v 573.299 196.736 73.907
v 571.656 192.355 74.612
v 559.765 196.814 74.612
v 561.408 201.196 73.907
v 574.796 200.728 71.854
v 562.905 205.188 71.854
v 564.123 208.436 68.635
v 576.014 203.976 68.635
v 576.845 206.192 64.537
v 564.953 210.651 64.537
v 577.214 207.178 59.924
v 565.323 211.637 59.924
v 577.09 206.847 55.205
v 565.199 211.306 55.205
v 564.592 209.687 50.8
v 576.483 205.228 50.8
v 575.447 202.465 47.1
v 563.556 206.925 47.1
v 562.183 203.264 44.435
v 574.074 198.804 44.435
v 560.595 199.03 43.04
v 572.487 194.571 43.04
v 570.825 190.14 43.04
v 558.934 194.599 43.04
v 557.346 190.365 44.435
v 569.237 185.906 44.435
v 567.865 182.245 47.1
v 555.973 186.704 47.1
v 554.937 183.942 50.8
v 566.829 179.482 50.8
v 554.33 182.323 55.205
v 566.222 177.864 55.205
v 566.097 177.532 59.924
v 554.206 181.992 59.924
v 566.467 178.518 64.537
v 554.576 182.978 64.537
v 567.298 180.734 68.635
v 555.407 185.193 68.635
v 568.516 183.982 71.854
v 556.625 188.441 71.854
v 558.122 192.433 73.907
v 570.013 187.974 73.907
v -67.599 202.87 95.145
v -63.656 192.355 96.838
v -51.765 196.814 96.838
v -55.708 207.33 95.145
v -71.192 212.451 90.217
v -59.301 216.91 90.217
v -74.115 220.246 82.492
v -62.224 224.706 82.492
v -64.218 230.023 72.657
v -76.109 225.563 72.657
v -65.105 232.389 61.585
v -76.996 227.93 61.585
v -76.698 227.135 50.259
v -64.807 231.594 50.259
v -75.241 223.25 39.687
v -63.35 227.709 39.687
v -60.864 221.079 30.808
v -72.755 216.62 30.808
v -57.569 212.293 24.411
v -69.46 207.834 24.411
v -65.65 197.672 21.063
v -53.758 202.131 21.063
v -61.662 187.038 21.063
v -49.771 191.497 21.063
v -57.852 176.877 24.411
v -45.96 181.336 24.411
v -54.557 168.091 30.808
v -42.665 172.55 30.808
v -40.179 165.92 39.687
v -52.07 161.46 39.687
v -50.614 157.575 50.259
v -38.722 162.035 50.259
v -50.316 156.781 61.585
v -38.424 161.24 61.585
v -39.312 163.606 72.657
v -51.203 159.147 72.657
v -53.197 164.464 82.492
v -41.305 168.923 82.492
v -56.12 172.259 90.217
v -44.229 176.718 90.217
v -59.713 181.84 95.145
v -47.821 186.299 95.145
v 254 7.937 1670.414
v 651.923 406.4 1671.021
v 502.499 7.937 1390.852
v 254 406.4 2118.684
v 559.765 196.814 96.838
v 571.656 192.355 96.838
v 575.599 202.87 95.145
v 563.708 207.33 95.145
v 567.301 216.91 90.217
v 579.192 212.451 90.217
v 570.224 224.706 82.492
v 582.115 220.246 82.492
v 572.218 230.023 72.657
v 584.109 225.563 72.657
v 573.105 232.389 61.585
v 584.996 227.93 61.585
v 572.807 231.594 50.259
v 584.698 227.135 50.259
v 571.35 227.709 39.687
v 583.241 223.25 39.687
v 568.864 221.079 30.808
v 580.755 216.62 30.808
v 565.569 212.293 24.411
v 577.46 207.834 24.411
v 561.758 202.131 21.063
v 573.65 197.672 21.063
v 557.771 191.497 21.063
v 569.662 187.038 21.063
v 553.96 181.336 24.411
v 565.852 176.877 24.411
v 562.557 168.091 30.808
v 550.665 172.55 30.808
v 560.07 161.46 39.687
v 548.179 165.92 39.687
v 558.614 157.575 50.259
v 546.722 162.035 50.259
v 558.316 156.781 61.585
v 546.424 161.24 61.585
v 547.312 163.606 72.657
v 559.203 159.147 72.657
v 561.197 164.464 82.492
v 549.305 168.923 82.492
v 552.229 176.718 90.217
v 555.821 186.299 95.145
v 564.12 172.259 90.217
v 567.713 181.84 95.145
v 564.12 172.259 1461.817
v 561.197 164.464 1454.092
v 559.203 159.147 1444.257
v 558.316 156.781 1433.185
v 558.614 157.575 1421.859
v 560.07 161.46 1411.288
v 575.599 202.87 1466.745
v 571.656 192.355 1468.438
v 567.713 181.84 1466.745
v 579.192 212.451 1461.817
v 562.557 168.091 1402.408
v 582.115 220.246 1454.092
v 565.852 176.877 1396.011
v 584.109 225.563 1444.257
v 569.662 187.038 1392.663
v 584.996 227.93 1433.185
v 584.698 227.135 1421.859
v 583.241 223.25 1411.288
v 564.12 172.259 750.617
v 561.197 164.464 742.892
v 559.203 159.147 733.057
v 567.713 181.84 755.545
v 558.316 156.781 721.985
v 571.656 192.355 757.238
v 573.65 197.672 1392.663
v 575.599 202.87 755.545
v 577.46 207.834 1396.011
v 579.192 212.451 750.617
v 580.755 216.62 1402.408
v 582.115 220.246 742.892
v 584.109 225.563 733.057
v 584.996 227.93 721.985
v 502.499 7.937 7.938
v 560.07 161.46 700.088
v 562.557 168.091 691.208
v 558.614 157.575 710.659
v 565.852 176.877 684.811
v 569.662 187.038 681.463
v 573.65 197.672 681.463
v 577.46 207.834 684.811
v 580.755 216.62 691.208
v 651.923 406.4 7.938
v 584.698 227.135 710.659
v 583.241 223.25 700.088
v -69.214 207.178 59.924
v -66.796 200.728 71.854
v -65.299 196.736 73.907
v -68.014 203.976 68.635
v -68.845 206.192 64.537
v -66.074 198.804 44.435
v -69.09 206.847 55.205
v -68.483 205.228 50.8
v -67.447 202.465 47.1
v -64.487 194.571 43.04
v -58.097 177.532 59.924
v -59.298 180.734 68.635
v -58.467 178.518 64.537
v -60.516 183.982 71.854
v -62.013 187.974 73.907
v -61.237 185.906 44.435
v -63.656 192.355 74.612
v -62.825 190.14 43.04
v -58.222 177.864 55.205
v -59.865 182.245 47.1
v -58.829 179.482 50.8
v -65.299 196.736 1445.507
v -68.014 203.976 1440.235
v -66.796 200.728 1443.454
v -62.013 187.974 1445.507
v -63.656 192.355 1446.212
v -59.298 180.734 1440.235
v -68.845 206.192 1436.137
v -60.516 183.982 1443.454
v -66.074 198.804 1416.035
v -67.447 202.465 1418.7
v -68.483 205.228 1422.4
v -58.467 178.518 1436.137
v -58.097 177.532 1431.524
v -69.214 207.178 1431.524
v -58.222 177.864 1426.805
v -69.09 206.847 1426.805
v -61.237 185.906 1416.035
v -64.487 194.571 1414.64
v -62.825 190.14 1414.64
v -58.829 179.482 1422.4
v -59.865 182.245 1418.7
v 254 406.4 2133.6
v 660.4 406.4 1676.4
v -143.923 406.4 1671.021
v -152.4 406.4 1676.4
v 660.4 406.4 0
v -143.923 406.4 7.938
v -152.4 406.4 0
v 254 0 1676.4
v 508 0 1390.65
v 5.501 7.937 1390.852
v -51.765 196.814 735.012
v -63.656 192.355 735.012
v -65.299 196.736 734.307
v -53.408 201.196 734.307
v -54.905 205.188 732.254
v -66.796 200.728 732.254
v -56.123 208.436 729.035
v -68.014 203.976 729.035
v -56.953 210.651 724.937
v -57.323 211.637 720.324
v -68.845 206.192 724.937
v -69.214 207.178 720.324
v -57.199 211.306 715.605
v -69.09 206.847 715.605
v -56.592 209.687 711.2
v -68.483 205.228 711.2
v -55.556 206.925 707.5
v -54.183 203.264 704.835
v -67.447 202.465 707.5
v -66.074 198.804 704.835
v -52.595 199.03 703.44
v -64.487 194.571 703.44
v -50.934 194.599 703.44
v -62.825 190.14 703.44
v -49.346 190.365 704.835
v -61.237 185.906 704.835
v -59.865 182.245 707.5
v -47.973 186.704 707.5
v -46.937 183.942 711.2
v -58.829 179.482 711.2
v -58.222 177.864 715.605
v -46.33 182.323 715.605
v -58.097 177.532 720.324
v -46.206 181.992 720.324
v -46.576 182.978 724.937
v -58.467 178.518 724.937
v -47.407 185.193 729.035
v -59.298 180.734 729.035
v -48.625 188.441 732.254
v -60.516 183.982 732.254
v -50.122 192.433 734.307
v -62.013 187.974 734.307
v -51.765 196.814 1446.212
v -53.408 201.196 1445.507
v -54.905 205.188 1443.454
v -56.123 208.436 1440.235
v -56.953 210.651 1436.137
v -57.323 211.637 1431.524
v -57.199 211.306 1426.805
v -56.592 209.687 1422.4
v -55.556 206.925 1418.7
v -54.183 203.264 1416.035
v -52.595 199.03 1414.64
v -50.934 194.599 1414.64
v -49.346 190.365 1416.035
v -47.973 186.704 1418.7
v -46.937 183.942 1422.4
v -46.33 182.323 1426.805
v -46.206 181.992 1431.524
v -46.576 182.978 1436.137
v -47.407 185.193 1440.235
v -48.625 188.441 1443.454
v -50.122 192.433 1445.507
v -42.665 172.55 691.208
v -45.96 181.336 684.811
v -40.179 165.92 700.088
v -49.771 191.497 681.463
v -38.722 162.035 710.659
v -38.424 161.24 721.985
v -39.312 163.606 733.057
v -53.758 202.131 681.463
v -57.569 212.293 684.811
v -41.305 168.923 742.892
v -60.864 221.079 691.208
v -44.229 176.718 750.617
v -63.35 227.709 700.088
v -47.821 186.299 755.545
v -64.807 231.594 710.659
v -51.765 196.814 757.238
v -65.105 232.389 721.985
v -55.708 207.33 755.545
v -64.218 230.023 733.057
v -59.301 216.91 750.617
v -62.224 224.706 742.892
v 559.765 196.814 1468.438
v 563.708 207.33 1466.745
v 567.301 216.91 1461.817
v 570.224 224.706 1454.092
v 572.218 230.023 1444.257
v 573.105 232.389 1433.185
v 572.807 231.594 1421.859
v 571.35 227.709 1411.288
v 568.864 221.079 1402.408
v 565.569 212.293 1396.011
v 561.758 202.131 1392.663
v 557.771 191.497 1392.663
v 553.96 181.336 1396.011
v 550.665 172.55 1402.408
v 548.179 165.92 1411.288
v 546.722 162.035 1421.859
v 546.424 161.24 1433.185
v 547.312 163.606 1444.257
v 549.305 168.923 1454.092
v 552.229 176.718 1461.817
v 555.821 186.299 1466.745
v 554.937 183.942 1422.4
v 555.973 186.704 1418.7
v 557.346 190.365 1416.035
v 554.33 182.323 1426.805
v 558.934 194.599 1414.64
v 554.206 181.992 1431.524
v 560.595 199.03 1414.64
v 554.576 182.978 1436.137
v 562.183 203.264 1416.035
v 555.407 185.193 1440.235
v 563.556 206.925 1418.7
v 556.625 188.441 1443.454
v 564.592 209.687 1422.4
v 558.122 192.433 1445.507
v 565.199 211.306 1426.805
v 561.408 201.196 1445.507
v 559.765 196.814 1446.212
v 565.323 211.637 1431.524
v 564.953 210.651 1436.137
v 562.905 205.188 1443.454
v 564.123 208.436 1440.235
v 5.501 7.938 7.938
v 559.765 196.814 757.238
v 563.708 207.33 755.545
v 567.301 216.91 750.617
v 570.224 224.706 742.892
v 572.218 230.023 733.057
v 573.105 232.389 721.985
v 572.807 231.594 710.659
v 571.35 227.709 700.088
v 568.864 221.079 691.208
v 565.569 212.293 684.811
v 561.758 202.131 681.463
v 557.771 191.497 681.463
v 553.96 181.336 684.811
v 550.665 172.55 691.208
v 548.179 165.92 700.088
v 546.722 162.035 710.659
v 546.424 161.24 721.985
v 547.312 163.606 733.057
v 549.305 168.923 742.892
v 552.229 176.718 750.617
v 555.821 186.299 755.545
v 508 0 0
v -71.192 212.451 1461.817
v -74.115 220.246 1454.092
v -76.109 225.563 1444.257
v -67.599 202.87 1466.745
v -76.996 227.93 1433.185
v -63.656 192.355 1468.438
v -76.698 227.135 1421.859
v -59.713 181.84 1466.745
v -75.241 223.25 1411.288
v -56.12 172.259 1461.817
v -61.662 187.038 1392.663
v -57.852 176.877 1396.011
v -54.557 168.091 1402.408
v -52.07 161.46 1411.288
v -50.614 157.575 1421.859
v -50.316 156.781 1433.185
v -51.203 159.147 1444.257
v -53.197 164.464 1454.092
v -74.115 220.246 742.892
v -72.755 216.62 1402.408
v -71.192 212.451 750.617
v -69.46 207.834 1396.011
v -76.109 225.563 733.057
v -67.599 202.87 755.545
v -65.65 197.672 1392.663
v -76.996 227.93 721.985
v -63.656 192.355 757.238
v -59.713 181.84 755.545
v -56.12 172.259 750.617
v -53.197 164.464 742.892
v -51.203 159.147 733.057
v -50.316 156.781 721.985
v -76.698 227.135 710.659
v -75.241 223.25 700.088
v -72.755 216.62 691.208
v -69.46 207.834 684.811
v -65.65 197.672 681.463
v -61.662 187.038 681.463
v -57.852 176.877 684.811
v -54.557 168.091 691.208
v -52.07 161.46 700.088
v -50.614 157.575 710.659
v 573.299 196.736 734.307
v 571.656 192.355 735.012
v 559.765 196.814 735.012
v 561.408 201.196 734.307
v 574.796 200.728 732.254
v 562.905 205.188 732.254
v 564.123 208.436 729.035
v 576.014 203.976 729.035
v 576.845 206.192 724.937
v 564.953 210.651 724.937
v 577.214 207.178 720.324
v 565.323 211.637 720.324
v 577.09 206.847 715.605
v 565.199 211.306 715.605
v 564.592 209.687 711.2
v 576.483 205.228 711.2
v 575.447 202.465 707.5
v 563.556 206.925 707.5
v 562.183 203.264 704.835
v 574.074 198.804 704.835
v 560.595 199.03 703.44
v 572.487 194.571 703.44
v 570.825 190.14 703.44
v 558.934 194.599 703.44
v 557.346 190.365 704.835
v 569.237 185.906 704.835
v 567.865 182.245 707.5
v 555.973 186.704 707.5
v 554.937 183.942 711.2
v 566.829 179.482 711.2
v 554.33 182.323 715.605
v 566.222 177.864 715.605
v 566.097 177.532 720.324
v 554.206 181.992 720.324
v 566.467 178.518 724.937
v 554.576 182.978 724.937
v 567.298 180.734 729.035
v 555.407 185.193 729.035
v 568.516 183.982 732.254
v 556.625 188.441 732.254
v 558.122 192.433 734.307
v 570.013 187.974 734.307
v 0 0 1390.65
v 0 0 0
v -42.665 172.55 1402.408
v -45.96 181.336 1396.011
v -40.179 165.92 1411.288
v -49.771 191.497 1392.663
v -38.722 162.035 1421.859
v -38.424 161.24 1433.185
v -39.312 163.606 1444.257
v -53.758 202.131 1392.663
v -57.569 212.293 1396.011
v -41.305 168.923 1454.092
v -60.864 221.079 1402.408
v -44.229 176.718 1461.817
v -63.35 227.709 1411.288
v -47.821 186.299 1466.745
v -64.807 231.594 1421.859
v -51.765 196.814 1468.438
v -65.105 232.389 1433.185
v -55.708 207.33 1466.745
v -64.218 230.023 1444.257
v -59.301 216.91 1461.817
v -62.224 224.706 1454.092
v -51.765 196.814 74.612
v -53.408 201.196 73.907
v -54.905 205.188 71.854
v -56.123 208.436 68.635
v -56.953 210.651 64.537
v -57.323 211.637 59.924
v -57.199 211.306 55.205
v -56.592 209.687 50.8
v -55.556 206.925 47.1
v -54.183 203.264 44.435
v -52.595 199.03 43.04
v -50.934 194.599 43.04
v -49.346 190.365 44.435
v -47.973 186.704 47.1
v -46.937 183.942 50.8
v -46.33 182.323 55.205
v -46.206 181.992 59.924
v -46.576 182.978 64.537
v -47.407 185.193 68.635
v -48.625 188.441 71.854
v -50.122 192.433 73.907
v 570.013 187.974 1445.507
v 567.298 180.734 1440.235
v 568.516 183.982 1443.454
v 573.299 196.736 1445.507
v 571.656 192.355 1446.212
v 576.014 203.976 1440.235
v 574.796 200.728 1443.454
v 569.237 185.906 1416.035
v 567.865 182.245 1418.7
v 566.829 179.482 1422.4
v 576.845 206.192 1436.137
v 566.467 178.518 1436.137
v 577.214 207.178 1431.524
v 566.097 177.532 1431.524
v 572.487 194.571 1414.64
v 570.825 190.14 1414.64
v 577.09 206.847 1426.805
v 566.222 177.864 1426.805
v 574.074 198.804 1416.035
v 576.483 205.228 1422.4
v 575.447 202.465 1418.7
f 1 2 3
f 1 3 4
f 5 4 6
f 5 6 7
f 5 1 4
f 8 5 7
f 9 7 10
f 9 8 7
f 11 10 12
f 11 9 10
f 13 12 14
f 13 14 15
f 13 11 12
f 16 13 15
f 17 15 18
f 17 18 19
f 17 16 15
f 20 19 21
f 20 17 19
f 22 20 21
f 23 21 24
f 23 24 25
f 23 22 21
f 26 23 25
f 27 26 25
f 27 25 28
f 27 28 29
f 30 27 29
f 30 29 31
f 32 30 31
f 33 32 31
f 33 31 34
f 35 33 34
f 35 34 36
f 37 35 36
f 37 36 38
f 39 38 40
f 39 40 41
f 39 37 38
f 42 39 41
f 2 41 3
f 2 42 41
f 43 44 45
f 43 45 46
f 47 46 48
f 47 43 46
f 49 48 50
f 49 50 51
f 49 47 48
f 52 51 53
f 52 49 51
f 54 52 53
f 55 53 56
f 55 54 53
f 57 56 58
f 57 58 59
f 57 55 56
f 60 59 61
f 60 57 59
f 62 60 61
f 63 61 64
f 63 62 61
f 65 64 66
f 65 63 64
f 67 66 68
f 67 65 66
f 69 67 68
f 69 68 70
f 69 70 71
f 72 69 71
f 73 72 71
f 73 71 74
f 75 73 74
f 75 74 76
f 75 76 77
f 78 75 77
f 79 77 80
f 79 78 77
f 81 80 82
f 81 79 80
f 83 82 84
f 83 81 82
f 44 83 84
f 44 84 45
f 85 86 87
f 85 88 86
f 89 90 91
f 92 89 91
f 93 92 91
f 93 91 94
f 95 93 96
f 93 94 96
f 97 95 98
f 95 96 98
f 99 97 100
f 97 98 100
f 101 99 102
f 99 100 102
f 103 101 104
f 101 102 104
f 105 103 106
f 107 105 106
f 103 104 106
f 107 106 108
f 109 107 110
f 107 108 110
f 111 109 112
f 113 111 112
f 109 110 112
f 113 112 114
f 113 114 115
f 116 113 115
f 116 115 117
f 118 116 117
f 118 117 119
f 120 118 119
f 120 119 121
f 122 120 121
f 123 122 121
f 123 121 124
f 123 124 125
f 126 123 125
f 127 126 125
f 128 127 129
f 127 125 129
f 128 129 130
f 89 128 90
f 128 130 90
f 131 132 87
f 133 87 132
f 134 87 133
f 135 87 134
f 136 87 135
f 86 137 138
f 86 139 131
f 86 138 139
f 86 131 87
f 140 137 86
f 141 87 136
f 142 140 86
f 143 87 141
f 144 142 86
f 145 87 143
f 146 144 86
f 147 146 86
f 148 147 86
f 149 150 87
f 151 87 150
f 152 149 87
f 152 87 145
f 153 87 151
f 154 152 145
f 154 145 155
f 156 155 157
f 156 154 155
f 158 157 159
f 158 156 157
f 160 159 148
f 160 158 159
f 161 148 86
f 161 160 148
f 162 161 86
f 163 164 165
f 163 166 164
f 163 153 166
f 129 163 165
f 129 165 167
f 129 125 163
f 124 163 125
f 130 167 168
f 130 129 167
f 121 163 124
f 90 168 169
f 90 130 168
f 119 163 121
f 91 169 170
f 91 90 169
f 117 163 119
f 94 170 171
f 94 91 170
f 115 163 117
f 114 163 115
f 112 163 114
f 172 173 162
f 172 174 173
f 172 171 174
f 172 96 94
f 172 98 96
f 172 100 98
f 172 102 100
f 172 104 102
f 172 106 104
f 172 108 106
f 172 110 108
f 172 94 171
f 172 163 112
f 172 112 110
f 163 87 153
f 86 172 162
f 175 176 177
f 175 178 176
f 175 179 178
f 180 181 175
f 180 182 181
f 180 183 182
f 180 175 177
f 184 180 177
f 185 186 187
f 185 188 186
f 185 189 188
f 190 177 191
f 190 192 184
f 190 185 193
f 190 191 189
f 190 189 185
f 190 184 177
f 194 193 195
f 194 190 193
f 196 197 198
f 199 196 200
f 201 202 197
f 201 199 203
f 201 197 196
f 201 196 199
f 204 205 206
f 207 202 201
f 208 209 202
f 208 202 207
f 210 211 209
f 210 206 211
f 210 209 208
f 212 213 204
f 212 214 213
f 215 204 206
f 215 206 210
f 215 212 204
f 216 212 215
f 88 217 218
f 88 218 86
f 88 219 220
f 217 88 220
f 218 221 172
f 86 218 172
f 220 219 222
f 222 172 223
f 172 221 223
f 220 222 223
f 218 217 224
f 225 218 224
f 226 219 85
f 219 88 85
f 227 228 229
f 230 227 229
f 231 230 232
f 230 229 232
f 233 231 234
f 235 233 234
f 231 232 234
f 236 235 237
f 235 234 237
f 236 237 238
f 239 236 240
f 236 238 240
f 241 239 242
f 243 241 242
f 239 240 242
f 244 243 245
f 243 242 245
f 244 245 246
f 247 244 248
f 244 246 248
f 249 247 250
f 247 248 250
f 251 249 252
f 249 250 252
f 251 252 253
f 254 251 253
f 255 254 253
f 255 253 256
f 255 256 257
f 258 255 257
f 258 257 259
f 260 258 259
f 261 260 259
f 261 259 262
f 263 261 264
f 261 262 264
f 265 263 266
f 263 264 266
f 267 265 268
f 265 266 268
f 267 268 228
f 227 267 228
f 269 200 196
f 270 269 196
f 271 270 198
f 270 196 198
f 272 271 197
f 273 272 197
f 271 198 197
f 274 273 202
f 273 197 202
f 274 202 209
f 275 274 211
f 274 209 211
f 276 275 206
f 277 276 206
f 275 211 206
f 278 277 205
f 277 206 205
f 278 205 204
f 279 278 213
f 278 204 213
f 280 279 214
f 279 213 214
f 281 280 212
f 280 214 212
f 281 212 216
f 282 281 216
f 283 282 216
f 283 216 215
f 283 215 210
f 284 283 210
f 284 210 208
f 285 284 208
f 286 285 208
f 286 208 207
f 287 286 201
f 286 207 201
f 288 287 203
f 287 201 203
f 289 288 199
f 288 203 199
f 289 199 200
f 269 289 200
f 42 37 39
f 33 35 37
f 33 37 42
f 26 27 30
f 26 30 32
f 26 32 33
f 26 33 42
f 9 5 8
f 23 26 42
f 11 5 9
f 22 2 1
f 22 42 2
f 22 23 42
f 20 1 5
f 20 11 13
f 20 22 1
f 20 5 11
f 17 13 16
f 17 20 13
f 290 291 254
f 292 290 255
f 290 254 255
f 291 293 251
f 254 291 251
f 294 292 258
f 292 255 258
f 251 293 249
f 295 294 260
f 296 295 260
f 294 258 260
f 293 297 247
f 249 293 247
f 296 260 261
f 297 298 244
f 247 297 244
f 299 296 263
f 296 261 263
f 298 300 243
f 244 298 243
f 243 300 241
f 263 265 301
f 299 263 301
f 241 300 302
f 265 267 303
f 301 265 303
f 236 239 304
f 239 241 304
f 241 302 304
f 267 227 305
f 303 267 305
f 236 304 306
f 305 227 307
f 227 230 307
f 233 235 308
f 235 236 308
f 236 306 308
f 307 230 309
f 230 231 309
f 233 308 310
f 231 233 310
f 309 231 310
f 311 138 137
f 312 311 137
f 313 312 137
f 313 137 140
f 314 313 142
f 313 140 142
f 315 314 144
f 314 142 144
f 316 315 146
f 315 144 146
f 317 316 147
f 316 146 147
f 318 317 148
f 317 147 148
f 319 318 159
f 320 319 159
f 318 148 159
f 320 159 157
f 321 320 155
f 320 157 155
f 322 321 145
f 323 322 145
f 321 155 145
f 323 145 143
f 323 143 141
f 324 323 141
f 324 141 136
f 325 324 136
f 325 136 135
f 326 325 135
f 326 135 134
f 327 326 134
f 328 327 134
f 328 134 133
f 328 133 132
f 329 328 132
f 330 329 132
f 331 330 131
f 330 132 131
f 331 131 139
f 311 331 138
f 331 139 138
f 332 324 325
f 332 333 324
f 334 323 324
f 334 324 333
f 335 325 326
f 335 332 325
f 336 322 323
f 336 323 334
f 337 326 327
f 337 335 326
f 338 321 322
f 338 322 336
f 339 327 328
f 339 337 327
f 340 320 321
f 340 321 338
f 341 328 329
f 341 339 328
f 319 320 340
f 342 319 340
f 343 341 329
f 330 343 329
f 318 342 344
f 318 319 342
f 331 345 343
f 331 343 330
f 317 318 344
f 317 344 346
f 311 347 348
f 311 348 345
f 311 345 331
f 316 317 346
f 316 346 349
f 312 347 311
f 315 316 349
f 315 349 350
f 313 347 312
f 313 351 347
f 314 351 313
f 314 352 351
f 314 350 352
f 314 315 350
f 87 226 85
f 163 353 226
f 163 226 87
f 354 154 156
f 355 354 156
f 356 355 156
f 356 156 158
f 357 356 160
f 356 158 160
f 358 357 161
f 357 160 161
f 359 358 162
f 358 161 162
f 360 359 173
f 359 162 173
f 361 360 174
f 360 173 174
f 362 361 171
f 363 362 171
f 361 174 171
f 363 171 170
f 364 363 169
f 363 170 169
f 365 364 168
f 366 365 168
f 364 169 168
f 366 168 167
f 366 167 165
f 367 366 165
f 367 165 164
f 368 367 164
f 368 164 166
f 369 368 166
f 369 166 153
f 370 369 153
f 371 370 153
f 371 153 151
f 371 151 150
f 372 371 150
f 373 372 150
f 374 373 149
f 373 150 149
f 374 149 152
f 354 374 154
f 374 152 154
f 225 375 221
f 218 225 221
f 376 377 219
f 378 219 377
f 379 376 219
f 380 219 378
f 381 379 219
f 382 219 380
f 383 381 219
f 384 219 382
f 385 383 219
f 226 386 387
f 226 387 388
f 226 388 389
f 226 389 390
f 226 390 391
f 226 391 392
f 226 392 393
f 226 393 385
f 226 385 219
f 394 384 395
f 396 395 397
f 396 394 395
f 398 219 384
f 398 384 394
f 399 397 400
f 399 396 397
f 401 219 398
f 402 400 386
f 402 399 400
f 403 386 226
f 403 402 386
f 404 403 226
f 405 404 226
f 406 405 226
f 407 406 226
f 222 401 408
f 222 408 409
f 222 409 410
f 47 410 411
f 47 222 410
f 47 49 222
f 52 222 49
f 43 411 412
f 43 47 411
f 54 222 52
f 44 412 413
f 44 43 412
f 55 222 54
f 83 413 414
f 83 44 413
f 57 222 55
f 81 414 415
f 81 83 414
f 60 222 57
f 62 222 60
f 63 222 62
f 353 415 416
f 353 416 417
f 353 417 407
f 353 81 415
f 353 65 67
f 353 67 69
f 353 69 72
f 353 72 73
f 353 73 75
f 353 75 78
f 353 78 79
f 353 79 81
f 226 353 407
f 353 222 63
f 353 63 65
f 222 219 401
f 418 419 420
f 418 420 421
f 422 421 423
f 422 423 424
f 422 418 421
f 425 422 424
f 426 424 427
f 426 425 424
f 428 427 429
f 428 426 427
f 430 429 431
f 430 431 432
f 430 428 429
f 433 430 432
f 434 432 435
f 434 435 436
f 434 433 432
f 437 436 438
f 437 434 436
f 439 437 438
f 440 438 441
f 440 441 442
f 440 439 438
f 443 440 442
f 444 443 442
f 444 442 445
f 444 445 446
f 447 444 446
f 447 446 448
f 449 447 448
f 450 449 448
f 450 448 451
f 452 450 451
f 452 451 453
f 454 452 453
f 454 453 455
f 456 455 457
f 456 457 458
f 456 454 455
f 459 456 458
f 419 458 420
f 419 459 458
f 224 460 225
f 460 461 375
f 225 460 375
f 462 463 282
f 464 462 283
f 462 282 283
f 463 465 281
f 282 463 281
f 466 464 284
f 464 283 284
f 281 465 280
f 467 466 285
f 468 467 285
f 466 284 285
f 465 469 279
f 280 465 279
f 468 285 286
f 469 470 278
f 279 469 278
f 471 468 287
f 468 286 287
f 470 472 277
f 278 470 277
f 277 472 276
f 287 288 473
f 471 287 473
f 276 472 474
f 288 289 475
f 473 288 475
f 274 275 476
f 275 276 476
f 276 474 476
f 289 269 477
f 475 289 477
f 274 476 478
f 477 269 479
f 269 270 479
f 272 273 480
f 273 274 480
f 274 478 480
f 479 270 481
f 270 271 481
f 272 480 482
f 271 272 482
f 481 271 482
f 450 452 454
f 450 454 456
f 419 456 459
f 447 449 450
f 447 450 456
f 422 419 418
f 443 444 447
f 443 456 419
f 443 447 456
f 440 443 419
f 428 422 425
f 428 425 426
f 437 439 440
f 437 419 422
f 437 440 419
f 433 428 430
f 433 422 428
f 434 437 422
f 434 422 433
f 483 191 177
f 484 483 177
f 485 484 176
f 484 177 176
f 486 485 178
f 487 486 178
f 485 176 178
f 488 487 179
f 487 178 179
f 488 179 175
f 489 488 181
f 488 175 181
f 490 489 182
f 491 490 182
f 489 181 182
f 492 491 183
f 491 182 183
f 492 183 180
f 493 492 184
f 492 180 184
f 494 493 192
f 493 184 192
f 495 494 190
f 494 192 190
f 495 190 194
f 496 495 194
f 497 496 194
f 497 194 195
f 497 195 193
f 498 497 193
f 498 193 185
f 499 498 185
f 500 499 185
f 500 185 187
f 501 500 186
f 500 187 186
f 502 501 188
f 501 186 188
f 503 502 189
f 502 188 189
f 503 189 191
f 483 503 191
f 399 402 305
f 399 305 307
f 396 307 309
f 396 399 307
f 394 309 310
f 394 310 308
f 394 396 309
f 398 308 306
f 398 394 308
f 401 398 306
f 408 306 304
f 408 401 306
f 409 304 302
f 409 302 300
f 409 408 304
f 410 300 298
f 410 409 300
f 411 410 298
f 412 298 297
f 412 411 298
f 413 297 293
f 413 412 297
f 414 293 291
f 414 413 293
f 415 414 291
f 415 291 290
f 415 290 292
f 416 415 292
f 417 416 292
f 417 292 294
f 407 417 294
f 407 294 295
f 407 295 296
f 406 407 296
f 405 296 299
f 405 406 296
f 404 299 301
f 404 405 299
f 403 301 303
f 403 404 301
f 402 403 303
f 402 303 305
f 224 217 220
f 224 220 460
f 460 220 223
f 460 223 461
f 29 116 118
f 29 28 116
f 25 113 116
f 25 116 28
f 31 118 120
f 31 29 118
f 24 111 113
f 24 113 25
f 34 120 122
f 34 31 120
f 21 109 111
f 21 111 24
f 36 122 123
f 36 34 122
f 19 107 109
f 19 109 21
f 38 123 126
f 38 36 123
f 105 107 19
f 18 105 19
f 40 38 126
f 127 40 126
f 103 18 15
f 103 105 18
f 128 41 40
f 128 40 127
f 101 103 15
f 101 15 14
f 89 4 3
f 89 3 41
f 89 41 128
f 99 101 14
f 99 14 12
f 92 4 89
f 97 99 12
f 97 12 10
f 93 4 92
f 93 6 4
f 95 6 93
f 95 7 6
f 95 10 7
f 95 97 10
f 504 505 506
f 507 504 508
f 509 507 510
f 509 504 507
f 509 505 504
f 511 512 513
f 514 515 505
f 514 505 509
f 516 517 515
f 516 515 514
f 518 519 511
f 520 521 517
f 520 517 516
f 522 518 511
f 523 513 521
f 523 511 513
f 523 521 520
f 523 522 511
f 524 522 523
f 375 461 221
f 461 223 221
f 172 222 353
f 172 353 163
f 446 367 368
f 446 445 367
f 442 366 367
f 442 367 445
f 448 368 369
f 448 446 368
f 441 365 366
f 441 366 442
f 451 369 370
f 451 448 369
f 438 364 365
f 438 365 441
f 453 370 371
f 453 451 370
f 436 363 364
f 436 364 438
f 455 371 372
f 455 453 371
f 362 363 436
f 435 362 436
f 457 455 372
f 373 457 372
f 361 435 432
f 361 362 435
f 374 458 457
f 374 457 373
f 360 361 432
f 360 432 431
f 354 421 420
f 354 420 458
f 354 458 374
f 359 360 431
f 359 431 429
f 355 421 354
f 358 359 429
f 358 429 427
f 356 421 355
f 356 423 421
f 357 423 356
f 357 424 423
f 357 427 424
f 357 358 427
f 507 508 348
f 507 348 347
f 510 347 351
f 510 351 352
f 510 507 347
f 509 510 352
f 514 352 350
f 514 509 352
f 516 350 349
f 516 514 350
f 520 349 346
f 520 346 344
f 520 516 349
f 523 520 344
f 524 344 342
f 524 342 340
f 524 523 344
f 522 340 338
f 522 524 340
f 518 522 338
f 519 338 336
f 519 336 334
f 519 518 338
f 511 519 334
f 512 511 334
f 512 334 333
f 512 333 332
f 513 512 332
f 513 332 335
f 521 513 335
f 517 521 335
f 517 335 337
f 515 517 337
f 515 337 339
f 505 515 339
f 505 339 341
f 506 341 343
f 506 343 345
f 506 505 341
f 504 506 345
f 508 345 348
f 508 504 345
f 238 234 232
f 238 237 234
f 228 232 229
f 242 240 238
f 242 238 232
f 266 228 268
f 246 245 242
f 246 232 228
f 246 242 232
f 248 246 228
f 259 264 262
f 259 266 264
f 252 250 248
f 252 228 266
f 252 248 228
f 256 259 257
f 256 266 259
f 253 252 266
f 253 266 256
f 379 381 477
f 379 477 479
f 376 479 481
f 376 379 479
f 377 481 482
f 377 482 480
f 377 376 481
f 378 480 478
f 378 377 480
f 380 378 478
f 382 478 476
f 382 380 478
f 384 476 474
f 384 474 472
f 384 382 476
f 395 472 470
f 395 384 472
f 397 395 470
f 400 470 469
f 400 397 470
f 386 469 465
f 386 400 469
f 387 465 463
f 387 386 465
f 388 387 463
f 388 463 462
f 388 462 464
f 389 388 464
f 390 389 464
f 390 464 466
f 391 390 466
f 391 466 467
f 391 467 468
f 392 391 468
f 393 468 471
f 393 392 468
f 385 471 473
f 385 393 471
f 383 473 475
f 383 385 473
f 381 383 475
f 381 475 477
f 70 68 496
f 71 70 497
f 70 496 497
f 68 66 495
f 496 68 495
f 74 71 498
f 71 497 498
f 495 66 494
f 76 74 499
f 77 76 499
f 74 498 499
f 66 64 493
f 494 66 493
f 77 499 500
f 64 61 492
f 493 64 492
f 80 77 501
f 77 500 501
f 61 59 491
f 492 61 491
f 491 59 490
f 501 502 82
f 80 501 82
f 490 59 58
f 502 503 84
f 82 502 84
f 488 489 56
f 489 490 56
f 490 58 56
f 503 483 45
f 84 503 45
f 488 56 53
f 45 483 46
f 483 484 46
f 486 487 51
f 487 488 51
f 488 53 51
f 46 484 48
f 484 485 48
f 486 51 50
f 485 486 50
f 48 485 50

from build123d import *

# Parameters (mm, degrees)
BOSS_EXTRUDE1_DEPTH = 2133.6
CUT_EXTRUDE2_DEPTH  = 613.218203925
SHELL1_T            = -7.9375
SKETCH14_R          = 38.1
SKETCH14_R_2        = 15.875
BOSS_EXTRUDE2_DEPTH = 12.7


with BuildPart() as part:
    # Sketch1 → Boss-Extrude1 (new body)
    with BuildSketch(Plane.XY):
        Polygon((0, 0), (508, 0), (660.4, 406.4), (-152.4, 406.4), align=None)
    extrude(amount=BOSS_EXTRUDE1_DEPTH)

    # Sketch13 → Cut-Extrude2 (cut, symmetric, along a direction that is not the sketch's normal)
    with BuildSketch(Plane(origin=(254, 0, 0), x_dir=(0, 0, -1), z_dir=(1, 0, 0))):
        Polygon((-2133.6, 0), (-3174.648587482, 0), (-3174.648587482, 406.4), (-2133.6, 406.4), (-1676.4, 0), align=None)
    cut_extrude2 = extrude(amount=CUT_EXTRUDE2_DEPTH, dir=(0.664363839, 0, 0.747409319), both=True, mode=Mode.SUBTRACT)

    # Mirror1: Cut-Extrude2 across plane
    add(cut_extrude2.mirror(Plane(origin=(254, 0, 0), x_dir=(0, 0, 1), z_dir=(1, 0, 0))), mode=Mode.SUBTRACT)

    # Shell1
    shell1_openings = [part.faces().sort_by_distance(p)[0] for p in [
        (254, 406.4, 1097.28),
    ]]
    offset(amount=SHELL1_T, openings=shell1_openings, kind=Kind.INTERSECTION)

    # Sketch14 → Boss-Extrude2 (add)
    with BuildSketch(Plane(origin=(437.937750167, -164.226656313, 0), x_dir=(0, 0, 1), z_dir=(-0.936329178, 0.351123442, 0))):
        with Locations((58.7375, 380.829536089)):
            Circle(SKETCH14_R)
        with Locations((58.7375, 380.829536089)):
            Circle(SKETCH14_R_2, mode=Mode.SUBTRACT)
        with Locations((719.1375, 380.829536089)):
            Circle(SKETCH14_R)
        with Locations((719.1375, 380.829536089)):
            Circle(SKETCH14_R_2, mode=Mode.SUBTRACT)
        with Locations((1430.3375, 380.829536089)):
            Circle(SKETCH14_R)
        with Locations((1430.3375, 380.829536089)):
            Circle(SKETCH14_R_2, mode=Mode.SUBTRACT)
    boss_extrude2 = extrude(amount=BOSS_EXTRUDE2_DEPTH)

    # Mirror2: Boss-Extrude2 across plane
    add(boss_extrude2.mirror(Plane(origin=(254, 0, 0), x_dir=(0, 0, 1), z_dir=(1, 0, 0))))


solid = part.part
